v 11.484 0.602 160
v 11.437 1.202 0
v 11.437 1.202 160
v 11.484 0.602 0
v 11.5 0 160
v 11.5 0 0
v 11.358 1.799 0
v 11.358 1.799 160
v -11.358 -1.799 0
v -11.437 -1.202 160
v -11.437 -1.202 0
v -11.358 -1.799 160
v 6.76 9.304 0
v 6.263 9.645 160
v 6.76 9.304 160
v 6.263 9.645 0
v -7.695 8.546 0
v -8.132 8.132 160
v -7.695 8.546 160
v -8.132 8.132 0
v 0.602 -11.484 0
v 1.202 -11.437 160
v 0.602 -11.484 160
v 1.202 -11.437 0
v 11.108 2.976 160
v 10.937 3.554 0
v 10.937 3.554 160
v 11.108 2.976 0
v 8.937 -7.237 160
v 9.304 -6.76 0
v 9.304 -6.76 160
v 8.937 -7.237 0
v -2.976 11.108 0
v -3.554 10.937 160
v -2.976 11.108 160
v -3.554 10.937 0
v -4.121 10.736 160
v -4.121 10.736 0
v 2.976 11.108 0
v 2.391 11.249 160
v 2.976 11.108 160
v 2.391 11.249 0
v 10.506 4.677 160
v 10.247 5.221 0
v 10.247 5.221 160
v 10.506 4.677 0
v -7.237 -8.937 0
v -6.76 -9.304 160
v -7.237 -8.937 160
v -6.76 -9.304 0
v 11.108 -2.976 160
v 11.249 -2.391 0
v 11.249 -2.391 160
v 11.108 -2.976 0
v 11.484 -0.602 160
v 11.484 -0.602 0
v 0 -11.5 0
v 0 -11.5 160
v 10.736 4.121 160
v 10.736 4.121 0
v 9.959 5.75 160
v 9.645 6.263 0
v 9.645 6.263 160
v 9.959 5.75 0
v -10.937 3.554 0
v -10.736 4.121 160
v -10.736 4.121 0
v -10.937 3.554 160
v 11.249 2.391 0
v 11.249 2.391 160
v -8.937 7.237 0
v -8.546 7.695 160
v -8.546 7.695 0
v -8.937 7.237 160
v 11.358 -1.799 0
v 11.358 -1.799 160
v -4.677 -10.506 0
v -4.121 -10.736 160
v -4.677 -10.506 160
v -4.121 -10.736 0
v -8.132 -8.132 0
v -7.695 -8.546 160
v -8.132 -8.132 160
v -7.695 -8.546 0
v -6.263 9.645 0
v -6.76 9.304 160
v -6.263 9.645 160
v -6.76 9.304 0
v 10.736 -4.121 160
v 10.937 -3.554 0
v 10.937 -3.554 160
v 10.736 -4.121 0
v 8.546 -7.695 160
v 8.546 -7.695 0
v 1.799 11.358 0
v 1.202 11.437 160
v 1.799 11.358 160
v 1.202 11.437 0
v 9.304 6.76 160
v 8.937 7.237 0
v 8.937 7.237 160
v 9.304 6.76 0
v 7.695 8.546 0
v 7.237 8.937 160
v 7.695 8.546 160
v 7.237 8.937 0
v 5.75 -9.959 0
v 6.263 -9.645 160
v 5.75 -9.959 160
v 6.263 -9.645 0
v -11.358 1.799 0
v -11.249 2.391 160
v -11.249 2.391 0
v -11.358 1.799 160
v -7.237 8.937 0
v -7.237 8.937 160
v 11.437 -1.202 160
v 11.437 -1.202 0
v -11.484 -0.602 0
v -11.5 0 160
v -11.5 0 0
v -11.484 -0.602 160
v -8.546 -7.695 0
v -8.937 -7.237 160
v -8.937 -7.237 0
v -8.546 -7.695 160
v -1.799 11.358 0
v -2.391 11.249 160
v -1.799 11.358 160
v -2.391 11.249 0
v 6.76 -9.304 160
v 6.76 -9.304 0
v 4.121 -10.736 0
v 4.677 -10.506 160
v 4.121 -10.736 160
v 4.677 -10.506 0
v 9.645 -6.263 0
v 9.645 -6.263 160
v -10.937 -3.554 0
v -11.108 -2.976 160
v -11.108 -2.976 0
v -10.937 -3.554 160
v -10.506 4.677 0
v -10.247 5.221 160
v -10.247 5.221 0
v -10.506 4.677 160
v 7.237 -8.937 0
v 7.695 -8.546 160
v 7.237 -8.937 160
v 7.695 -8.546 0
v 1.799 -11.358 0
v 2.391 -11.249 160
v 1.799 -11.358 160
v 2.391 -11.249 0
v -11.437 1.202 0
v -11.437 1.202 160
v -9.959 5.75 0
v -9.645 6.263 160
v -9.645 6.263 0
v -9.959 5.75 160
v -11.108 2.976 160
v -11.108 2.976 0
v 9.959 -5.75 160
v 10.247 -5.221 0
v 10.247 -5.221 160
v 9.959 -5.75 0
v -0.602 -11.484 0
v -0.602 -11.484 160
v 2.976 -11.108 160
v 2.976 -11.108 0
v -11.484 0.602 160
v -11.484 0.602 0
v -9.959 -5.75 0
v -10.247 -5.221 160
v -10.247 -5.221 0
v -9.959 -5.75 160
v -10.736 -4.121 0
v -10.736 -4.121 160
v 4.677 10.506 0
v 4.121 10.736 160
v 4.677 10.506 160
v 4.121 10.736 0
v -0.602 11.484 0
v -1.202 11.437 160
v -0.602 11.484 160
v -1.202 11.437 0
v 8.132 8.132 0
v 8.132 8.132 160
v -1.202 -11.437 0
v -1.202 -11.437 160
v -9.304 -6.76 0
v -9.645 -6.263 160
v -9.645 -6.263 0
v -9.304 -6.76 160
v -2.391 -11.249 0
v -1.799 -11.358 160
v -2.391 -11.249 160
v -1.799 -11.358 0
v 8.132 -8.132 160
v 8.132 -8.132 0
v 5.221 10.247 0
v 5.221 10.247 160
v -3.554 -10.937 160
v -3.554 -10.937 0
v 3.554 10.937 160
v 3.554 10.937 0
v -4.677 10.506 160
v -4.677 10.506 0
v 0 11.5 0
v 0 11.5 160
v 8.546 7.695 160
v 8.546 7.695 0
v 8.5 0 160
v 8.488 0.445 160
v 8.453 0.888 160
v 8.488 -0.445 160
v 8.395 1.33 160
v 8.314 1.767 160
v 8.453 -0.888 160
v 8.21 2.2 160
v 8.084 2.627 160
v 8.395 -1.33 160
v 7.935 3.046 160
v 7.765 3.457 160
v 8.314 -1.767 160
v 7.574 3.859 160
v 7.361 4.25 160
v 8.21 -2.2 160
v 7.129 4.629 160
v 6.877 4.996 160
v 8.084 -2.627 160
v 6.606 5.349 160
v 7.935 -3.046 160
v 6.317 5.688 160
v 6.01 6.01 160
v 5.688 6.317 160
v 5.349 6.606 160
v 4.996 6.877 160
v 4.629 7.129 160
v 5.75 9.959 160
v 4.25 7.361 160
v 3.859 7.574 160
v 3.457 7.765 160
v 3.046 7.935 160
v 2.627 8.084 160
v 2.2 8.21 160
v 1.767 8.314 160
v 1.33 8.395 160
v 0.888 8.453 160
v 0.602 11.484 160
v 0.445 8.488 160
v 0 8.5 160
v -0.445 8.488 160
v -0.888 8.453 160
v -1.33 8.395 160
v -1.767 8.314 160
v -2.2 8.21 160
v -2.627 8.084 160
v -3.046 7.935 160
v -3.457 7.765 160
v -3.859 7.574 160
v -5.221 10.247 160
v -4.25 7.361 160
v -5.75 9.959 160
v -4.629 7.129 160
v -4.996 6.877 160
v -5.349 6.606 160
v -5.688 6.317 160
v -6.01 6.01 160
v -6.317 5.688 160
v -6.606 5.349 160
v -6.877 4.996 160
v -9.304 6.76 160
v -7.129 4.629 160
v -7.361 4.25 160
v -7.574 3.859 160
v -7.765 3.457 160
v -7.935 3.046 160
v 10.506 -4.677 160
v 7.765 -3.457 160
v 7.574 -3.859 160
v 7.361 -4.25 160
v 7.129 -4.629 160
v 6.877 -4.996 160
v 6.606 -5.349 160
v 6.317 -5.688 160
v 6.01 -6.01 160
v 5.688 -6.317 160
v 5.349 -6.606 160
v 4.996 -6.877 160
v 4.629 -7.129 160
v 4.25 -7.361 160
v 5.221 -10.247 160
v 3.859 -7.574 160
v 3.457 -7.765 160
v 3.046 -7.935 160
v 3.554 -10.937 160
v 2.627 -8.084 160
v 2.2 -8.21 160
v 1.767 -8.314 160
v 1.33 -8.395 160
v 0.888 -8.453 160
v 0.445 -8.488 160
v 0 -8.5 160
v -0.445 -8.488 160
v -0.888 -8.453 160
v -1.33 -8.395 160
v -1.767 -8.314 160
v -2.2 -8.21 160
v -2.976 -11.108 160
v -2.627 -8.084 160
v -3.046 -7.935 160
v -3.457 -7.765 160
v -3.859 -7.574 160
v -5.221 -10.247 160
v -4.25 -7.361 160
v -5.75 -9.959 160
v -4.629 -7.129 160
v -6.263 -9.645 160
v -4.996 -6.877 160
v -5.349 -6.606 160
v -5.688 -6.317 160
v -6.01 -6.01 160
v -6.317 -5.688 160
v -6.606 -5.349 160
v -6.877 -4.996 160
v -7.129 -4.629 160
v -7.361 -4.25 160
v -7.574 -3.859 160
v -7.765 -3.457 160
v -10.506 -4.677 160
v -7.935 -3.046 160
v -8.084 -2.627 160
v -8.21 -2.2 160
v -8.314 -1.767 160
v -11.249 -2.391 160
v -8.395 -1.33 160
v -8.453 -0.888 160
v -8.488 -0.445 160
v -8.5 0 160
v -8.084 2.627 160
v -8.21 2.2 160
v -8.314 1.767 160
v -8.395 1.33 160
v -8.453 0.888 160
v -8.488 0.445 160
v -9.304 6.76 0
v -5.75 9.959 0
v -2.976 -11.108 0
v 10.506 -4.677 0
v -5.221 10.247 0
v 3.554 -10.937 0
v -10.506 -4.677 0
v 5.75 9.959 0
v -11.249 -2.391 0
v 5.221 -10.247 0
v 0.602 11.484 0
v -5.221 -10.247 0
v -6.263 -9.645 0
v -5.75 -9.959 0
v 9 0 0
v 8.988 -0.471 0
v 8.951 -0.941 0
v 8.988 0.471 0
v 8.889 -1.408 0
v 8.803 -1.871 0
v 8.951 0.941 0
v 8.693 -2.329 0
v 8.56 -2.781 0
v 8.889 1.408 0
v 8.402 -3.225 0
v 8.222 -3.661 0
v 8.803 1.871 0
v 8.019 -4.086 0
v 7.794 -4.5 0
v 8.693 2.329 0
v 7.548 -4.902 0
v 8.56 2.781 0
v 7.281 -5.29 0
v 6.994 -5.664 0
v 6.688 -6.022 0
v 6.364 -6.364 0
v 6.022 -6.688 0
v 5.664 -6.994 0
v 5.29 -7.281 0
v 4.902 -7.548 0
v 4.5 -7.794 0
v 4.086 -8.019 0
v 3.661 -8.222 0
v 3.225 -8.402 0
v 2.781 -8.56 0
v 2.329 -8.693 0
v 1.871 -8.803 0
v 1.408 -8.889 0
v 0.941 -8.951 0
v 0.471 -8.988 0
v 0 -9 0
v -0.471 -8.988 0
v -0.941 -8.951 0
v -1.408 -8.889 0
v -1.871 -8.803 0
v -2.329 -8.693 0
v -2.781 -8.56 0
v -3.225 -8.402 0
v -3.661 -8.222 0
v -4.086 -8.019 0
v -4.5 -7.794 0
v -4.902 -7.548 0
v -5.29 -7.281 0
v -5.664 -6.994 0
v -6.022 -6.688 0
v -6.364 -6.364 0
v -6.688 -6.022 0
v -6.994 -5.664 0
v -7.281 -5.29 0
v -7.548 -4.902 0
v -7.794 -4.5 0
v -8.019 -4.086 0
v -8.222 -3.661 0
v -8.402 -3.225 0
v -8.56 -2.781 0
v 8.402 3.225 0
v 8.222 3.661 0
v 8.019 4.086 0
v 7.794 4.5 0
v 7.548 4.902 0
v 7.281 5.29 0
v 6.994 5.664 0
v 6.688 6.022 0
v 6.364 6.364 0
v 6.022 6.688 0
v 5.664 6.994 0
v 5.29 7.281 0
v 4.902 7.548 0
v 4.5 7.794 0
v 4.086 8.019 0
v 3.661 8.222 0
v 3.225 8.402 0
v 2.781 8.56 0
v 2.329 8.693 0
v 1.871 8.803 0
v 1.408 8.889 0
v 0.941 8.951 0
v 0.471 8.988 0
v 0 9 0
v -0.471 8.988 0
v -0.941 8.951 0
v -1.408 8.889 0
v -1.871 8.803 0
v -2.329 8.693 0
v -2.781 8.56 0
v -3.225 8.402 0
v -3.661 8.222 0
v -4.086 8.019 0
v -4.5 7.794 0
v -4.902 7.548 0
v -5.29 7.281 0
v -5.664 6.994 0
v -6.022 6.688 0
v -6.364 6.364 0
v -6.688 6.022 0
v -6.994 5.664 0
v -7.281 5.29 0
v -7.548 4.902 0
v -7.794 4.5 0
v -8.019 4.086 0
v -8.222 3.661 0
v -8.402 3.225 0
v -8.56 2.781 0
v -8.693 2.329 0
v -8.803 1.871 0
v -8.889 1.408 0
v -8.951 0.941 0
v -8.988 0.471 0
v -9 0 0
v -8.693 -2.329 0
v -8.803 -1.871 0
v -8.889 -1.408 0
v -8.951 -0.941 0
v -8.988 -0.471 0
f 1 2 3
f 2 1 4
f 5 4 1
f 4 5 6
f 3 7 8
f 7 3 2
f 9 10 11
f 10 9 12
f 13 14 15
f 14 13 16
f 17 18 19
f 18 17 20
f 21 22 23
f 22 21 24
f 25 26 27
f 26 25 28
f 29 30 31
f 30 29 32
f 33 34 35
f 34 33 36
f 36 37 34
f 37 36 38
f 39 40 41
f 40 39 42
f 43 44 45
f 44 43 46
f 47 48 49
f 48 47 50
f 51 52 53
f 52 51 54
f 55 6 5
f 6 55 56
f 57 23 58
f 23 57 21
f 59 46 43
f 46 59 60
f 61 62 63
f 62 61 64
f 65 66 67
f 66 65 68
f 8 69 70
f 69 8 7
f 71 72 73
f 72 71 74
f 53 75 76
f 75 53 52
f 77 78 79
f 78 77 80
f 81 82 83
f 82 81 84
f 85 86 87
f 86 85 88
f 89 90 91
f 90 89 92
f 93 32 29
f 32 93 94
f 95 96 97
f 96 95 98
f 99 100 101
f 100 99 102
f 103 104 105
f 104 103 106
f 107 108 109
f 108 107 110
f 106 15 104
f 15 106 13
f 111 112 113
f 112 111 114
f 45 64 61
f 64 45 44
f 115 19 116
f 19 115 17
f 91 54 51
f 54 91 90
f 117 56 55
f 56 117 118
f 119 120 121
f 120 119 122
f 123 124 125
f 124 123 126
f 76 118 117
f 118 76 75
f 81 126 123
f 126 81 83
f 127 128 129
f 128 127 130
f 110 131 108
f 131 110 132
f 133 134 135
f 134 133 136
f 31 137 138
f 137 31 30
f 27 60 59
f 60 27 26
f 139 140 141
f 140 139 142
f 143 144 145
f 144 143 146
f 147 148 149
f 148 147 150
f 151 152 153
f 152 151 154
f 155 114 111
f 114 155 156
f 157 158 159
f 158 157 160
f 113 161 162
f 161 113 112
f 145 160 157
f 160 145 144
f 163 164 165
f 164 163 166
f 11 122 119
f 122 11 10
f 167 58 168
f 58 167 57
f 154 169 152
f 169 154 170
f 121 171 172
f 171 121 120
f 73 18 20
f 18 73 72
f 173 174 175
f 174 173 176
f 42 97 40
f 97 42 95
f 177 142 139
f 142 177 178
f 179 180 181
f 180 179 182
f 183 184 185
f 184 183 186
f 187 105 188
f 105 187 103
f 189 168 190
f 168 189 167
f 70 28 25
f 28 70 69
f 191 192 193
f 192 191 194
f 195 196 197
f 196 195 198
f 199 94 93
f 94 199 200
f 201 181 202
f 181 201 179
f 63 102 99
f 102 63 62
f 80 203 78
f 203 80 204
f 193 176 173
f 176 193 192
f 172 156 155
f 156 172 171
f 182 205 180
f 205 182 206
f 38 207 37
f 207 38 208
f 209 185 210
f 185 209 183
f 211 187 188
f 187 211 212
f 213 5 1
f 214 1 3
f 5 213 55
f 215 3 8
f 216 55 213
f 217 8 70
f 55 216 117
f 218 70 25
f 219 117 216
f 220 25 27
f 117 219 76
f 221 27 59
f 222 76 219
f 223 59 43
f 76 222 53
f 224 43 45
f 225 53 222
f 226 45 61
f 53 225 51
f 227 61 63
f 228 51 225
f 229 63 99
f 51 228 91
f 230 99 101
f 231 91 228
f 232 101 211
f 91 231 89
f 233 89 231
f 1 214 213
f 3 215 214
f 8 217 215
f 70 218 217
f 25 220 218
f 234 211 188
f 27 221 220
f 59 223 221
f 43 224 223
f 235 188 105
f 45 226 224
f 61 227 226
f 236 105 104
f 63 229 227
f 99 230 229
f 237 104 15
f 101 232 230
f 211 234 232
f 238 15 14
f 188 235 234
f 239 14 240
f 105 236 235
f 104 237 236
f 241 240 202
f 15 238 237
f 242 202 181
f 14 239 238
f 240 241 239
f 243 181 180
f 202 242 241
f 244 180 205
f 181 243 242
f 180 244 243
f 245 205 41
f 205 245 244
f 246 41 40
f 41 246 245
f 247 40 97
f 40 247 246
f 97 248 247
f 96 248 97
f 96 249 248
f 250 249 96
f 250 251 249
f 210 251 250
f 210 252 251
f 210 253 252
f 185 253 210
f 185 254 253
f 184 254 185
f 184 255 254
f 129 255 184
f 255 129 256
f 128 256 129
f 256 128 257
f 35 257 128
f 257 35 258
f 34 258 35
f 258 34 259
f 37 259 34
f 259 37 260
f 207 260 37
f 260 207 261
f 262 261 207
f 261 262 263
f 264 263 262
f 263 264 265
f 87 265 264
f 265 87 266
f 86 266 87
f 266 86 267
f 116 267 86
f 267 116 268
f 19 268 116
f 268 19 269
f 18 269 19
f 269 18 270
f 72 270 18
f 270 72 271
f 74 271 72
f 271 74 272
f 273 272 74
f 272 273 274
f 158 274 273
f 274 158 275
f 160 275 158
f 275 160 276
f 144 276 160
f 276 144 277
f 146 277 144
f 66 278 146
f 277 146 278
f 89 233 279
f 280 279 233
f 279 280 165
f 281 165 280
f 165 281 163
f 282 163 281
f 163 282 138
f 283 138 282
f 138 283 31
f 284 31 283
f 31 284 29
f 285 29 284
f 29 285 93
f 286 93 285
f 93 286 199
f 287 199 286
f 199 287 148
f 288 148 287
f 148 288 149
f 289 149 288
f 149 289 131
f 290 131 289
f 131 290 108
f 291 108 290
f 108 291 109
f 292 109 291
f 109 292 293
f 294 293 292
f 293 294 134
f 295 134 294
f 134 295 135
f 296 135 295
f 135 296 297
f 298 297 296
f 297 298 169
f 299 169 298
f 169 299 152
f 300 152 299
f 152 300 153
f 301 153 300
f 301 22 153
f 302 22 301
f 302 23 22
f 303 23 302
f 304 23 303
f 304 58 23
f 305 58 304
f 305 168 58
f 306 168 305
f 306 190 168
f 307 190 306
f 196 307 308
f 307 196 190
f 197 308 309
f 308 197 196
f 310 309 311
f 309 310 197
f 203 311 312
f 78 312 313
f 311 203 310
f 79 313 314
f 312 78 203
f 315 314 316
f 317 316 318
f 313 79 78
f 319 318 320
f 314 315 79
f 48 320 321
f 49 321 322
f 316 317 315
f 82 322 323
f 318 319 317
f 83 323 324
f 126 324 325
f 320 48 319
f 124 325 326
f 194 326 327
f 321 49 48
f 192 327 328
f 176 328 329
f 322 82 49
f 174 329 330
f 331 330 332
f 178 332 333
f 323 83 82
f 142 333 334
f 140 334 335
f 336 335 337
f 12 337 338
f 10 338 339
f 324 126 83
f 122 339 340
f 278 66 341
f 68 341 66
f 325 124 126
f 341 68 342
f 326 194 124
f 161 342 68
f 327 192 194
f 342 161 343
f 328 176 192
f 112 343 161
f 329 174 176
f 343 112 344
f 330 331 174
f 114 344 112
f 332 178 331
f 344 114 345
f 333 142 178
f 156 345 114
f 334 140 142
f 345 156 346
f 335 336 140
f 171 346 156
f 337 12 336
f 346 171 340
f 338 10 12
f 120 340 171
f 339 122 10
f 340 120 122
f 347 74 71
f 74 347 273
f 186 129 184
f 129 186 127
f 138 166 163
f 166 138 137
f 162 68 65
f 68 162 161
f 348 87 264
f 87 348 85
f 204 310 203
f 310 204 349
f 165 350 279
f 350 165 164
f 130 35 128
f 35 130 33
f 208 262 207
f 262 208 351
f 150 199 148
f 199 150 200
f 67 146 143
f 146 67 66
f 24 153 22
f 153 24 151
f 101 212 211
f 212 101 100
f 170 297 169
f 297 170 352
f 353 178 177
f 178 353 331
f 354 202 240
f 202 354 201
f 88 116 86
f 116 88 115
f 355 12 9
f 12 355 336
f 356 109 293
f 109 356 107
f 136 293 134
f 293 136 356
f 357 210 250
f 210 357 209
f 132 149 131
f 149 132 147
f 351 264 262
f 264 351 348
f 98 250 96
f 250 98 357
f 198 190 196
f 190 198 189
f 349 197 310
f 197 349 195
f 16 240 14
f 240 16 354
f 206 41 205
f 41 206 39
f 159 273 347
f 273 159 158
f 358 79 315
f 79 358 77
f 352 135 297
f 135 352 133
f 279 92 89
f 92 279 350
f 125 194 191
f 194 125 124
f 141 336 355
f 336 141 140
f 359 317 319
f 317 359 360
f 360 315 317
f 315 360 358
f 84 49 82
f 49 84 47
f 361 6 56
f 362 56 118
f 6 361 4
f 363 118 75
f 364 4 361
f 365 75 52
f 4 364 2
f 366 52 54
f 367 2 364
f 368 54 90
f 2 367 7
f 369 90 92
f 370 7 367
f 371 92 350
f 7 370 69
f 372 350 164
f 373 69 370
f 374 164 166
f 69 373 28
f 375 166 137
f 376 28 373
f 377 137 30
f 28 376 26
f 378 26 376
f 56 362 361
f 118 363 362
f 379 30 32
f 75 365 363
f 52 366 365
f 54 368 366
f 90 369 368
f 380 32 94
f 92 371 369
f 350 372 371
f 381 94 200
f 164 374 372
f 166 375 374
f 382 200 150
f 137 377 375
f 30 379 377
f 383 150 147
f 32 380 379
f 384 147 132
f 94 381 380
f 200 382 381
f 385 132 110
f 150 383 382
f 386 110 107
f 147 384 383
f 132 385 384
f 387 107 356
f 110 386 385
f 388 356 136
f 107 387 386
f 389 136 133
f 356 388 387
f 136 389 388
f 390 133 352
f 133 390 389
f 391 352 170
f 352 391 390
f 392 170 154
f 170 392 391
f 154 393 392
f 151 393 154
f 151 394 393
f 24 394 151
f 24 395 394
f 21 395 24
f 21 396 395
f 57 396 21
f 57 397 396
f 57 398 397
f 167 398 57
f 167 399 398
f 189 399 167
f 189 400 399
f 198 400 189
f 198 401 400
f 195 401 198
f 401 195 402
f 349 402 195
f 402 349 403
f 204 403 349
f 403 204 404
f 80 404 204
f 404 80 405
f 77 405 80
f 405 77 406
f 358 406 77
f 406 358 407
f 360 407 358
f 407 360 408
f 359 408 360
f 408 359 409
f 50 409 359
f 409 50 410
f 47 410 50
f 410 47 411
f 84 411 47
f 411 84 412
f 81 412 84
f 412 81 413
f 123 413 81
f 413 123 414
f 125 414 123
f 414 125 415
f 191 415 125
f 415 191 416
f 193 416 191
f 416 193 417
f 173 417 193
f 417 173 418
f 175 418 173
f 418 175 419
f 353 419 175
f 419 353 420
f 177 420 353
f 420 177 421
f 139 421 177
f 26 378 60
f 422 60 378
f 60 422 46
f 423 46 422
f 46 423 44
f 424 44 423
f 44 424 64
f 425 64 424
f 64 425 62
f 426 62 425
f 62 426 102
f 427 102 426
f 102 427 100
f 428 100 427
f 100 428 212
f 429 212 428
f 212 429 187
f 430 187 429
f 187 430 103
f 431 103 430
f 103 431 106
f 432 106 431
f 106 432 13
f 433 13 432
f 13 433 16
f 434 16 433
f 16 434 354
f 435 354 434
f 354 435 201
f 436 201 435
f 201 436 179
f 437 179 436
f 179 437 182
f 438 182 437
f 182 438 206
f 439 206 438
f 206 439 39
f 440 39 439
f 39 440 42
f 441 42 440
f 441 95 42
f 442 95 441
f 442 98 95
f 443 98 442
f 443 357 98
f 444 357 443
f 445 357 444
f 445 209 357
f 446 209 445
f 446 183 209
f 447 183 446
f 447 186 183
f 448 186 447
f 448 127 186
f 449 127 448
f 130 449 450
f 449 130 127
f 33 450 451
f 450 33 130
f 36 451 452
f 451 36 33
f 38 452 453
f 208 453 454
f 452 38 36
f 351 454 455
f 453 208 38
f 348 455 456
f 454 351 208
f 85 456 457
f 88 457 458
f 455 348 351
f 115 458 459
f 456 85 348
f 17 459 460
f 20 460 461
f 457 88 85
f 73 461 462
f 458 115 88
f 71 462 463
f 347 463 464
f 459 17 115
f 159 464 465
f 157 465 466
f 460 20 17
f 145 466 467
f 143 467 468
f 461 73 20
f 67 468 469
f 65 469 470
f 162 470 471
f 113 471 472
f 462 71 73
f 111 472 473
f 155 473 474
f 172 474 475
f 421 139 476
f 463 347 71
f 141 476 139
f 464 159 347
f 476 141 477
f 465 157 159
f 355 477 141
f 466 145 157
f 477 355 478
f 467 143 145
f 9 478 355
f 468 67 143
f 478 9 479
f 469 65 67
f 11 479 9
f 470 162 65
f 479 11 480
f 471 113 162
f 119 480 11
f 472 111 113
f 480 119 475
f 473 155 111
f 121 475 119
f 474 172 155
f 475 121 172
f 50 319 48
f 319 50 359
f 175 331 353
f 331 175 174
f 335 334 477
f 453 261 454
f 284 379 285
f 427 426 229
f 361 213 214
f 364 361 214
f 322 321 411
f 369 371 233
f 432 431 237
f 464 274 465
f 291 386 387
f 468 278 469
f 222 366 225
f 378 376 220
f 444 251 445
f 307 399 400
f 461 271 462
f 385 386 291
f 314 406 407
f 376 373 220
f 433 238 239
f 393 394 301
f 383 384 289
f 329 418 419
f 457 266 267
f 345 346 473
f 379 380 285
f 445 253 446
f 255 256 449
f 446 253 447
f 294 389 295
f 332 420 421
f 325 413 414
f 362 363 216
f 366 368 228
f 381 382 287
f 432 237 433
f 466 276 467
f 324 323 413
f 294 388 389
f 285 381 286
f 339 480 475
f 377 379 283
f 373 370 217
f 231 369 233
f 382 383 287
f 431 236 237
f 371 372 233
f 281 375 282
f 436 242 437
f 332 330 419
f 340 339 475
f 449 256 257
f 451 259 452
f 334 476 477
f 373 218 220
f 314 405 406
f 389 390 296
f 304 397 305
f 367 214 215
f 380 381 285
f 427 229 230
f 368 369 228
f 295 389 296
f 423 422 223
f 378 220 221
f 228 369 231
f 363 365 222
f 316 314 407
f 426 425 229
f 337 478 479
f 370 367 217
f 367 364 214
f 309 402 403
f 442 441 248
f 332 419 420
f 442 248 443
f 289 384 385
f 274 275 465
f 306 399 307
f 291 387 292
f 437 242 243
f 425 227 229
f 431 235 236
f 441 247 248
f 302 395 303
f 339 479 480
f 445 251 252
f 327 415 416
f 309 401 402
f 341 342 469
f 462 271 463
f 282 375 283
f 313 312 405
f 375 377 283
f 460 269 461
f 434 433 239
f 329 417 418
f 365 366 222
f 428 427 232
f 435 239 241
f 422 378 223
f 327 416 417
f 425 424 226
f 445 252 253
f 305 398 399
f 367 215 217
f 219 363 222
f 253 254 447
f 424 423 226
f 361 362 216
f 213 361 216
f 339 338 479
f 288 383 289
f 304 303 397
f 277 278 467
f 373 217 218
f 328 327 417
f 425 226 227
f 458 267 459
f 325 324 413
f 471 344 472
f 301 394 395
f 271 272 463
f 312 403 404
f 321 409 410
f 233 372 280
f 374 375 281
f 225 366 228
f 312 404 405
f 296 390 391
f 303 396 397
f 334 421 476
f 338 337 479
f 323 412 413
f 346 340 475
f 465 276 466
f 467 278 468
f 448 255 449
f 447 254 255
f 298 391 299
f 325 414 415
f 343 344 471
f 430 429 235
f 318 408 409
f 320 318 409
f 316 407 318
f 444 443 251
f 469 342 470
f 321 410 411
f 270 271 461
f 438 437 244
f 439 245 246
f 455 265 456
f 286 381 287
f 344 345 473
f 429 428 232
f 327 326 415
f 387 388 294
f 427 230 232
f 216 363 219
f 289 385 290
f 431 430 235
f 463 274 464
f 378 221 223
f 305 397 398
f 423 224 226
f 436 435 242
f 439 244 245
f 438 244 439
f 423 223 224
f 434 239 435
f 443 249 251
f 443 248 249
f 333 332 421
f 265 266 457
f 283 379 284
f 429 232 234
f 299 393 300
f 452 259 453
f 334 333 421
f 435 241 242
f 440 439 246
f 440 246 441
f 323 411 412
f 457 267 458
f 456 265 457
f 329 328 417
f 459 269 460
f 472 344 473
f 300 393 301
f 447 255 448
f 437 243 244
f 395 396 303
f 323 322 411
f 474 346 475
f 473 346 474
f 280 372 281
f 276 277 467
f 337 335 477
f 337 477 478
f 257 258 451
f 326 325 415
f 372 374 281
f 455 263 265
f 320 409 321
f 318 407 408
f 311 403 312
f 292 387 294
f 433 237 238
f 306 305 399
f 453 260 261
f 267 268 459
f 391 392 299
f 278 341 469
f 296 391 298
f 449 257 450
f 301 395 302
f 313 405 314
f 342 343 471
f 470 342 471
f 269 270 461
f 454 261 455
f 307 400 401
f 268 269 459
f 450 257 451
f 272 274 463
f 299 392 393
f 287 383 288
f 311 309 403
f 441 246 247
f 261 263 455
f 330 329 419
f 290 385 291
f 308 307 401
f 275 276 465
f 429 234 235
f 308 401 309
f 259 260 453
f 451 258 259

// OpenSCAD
// Pipes are 18mm diameter
// up to 160mm length.
// thickness 5mm?
// 

diameter = 18;
length = 160;
thickness = 5;

$fn=120;

outer_diameter = diameter + thickness;

difference() {
    // Build the outer shape
    cylinder(h=length, d=outer_diameter);
    
    // Everything else in difference cuts from the
    // first object, so this cuts out the inner
    // The inner cuts can be made such that the
    // diameter is smaller at one end (in this instance 1mm)
    cylinder(h=length, d1=diameter, d2=diameter-1);
}
